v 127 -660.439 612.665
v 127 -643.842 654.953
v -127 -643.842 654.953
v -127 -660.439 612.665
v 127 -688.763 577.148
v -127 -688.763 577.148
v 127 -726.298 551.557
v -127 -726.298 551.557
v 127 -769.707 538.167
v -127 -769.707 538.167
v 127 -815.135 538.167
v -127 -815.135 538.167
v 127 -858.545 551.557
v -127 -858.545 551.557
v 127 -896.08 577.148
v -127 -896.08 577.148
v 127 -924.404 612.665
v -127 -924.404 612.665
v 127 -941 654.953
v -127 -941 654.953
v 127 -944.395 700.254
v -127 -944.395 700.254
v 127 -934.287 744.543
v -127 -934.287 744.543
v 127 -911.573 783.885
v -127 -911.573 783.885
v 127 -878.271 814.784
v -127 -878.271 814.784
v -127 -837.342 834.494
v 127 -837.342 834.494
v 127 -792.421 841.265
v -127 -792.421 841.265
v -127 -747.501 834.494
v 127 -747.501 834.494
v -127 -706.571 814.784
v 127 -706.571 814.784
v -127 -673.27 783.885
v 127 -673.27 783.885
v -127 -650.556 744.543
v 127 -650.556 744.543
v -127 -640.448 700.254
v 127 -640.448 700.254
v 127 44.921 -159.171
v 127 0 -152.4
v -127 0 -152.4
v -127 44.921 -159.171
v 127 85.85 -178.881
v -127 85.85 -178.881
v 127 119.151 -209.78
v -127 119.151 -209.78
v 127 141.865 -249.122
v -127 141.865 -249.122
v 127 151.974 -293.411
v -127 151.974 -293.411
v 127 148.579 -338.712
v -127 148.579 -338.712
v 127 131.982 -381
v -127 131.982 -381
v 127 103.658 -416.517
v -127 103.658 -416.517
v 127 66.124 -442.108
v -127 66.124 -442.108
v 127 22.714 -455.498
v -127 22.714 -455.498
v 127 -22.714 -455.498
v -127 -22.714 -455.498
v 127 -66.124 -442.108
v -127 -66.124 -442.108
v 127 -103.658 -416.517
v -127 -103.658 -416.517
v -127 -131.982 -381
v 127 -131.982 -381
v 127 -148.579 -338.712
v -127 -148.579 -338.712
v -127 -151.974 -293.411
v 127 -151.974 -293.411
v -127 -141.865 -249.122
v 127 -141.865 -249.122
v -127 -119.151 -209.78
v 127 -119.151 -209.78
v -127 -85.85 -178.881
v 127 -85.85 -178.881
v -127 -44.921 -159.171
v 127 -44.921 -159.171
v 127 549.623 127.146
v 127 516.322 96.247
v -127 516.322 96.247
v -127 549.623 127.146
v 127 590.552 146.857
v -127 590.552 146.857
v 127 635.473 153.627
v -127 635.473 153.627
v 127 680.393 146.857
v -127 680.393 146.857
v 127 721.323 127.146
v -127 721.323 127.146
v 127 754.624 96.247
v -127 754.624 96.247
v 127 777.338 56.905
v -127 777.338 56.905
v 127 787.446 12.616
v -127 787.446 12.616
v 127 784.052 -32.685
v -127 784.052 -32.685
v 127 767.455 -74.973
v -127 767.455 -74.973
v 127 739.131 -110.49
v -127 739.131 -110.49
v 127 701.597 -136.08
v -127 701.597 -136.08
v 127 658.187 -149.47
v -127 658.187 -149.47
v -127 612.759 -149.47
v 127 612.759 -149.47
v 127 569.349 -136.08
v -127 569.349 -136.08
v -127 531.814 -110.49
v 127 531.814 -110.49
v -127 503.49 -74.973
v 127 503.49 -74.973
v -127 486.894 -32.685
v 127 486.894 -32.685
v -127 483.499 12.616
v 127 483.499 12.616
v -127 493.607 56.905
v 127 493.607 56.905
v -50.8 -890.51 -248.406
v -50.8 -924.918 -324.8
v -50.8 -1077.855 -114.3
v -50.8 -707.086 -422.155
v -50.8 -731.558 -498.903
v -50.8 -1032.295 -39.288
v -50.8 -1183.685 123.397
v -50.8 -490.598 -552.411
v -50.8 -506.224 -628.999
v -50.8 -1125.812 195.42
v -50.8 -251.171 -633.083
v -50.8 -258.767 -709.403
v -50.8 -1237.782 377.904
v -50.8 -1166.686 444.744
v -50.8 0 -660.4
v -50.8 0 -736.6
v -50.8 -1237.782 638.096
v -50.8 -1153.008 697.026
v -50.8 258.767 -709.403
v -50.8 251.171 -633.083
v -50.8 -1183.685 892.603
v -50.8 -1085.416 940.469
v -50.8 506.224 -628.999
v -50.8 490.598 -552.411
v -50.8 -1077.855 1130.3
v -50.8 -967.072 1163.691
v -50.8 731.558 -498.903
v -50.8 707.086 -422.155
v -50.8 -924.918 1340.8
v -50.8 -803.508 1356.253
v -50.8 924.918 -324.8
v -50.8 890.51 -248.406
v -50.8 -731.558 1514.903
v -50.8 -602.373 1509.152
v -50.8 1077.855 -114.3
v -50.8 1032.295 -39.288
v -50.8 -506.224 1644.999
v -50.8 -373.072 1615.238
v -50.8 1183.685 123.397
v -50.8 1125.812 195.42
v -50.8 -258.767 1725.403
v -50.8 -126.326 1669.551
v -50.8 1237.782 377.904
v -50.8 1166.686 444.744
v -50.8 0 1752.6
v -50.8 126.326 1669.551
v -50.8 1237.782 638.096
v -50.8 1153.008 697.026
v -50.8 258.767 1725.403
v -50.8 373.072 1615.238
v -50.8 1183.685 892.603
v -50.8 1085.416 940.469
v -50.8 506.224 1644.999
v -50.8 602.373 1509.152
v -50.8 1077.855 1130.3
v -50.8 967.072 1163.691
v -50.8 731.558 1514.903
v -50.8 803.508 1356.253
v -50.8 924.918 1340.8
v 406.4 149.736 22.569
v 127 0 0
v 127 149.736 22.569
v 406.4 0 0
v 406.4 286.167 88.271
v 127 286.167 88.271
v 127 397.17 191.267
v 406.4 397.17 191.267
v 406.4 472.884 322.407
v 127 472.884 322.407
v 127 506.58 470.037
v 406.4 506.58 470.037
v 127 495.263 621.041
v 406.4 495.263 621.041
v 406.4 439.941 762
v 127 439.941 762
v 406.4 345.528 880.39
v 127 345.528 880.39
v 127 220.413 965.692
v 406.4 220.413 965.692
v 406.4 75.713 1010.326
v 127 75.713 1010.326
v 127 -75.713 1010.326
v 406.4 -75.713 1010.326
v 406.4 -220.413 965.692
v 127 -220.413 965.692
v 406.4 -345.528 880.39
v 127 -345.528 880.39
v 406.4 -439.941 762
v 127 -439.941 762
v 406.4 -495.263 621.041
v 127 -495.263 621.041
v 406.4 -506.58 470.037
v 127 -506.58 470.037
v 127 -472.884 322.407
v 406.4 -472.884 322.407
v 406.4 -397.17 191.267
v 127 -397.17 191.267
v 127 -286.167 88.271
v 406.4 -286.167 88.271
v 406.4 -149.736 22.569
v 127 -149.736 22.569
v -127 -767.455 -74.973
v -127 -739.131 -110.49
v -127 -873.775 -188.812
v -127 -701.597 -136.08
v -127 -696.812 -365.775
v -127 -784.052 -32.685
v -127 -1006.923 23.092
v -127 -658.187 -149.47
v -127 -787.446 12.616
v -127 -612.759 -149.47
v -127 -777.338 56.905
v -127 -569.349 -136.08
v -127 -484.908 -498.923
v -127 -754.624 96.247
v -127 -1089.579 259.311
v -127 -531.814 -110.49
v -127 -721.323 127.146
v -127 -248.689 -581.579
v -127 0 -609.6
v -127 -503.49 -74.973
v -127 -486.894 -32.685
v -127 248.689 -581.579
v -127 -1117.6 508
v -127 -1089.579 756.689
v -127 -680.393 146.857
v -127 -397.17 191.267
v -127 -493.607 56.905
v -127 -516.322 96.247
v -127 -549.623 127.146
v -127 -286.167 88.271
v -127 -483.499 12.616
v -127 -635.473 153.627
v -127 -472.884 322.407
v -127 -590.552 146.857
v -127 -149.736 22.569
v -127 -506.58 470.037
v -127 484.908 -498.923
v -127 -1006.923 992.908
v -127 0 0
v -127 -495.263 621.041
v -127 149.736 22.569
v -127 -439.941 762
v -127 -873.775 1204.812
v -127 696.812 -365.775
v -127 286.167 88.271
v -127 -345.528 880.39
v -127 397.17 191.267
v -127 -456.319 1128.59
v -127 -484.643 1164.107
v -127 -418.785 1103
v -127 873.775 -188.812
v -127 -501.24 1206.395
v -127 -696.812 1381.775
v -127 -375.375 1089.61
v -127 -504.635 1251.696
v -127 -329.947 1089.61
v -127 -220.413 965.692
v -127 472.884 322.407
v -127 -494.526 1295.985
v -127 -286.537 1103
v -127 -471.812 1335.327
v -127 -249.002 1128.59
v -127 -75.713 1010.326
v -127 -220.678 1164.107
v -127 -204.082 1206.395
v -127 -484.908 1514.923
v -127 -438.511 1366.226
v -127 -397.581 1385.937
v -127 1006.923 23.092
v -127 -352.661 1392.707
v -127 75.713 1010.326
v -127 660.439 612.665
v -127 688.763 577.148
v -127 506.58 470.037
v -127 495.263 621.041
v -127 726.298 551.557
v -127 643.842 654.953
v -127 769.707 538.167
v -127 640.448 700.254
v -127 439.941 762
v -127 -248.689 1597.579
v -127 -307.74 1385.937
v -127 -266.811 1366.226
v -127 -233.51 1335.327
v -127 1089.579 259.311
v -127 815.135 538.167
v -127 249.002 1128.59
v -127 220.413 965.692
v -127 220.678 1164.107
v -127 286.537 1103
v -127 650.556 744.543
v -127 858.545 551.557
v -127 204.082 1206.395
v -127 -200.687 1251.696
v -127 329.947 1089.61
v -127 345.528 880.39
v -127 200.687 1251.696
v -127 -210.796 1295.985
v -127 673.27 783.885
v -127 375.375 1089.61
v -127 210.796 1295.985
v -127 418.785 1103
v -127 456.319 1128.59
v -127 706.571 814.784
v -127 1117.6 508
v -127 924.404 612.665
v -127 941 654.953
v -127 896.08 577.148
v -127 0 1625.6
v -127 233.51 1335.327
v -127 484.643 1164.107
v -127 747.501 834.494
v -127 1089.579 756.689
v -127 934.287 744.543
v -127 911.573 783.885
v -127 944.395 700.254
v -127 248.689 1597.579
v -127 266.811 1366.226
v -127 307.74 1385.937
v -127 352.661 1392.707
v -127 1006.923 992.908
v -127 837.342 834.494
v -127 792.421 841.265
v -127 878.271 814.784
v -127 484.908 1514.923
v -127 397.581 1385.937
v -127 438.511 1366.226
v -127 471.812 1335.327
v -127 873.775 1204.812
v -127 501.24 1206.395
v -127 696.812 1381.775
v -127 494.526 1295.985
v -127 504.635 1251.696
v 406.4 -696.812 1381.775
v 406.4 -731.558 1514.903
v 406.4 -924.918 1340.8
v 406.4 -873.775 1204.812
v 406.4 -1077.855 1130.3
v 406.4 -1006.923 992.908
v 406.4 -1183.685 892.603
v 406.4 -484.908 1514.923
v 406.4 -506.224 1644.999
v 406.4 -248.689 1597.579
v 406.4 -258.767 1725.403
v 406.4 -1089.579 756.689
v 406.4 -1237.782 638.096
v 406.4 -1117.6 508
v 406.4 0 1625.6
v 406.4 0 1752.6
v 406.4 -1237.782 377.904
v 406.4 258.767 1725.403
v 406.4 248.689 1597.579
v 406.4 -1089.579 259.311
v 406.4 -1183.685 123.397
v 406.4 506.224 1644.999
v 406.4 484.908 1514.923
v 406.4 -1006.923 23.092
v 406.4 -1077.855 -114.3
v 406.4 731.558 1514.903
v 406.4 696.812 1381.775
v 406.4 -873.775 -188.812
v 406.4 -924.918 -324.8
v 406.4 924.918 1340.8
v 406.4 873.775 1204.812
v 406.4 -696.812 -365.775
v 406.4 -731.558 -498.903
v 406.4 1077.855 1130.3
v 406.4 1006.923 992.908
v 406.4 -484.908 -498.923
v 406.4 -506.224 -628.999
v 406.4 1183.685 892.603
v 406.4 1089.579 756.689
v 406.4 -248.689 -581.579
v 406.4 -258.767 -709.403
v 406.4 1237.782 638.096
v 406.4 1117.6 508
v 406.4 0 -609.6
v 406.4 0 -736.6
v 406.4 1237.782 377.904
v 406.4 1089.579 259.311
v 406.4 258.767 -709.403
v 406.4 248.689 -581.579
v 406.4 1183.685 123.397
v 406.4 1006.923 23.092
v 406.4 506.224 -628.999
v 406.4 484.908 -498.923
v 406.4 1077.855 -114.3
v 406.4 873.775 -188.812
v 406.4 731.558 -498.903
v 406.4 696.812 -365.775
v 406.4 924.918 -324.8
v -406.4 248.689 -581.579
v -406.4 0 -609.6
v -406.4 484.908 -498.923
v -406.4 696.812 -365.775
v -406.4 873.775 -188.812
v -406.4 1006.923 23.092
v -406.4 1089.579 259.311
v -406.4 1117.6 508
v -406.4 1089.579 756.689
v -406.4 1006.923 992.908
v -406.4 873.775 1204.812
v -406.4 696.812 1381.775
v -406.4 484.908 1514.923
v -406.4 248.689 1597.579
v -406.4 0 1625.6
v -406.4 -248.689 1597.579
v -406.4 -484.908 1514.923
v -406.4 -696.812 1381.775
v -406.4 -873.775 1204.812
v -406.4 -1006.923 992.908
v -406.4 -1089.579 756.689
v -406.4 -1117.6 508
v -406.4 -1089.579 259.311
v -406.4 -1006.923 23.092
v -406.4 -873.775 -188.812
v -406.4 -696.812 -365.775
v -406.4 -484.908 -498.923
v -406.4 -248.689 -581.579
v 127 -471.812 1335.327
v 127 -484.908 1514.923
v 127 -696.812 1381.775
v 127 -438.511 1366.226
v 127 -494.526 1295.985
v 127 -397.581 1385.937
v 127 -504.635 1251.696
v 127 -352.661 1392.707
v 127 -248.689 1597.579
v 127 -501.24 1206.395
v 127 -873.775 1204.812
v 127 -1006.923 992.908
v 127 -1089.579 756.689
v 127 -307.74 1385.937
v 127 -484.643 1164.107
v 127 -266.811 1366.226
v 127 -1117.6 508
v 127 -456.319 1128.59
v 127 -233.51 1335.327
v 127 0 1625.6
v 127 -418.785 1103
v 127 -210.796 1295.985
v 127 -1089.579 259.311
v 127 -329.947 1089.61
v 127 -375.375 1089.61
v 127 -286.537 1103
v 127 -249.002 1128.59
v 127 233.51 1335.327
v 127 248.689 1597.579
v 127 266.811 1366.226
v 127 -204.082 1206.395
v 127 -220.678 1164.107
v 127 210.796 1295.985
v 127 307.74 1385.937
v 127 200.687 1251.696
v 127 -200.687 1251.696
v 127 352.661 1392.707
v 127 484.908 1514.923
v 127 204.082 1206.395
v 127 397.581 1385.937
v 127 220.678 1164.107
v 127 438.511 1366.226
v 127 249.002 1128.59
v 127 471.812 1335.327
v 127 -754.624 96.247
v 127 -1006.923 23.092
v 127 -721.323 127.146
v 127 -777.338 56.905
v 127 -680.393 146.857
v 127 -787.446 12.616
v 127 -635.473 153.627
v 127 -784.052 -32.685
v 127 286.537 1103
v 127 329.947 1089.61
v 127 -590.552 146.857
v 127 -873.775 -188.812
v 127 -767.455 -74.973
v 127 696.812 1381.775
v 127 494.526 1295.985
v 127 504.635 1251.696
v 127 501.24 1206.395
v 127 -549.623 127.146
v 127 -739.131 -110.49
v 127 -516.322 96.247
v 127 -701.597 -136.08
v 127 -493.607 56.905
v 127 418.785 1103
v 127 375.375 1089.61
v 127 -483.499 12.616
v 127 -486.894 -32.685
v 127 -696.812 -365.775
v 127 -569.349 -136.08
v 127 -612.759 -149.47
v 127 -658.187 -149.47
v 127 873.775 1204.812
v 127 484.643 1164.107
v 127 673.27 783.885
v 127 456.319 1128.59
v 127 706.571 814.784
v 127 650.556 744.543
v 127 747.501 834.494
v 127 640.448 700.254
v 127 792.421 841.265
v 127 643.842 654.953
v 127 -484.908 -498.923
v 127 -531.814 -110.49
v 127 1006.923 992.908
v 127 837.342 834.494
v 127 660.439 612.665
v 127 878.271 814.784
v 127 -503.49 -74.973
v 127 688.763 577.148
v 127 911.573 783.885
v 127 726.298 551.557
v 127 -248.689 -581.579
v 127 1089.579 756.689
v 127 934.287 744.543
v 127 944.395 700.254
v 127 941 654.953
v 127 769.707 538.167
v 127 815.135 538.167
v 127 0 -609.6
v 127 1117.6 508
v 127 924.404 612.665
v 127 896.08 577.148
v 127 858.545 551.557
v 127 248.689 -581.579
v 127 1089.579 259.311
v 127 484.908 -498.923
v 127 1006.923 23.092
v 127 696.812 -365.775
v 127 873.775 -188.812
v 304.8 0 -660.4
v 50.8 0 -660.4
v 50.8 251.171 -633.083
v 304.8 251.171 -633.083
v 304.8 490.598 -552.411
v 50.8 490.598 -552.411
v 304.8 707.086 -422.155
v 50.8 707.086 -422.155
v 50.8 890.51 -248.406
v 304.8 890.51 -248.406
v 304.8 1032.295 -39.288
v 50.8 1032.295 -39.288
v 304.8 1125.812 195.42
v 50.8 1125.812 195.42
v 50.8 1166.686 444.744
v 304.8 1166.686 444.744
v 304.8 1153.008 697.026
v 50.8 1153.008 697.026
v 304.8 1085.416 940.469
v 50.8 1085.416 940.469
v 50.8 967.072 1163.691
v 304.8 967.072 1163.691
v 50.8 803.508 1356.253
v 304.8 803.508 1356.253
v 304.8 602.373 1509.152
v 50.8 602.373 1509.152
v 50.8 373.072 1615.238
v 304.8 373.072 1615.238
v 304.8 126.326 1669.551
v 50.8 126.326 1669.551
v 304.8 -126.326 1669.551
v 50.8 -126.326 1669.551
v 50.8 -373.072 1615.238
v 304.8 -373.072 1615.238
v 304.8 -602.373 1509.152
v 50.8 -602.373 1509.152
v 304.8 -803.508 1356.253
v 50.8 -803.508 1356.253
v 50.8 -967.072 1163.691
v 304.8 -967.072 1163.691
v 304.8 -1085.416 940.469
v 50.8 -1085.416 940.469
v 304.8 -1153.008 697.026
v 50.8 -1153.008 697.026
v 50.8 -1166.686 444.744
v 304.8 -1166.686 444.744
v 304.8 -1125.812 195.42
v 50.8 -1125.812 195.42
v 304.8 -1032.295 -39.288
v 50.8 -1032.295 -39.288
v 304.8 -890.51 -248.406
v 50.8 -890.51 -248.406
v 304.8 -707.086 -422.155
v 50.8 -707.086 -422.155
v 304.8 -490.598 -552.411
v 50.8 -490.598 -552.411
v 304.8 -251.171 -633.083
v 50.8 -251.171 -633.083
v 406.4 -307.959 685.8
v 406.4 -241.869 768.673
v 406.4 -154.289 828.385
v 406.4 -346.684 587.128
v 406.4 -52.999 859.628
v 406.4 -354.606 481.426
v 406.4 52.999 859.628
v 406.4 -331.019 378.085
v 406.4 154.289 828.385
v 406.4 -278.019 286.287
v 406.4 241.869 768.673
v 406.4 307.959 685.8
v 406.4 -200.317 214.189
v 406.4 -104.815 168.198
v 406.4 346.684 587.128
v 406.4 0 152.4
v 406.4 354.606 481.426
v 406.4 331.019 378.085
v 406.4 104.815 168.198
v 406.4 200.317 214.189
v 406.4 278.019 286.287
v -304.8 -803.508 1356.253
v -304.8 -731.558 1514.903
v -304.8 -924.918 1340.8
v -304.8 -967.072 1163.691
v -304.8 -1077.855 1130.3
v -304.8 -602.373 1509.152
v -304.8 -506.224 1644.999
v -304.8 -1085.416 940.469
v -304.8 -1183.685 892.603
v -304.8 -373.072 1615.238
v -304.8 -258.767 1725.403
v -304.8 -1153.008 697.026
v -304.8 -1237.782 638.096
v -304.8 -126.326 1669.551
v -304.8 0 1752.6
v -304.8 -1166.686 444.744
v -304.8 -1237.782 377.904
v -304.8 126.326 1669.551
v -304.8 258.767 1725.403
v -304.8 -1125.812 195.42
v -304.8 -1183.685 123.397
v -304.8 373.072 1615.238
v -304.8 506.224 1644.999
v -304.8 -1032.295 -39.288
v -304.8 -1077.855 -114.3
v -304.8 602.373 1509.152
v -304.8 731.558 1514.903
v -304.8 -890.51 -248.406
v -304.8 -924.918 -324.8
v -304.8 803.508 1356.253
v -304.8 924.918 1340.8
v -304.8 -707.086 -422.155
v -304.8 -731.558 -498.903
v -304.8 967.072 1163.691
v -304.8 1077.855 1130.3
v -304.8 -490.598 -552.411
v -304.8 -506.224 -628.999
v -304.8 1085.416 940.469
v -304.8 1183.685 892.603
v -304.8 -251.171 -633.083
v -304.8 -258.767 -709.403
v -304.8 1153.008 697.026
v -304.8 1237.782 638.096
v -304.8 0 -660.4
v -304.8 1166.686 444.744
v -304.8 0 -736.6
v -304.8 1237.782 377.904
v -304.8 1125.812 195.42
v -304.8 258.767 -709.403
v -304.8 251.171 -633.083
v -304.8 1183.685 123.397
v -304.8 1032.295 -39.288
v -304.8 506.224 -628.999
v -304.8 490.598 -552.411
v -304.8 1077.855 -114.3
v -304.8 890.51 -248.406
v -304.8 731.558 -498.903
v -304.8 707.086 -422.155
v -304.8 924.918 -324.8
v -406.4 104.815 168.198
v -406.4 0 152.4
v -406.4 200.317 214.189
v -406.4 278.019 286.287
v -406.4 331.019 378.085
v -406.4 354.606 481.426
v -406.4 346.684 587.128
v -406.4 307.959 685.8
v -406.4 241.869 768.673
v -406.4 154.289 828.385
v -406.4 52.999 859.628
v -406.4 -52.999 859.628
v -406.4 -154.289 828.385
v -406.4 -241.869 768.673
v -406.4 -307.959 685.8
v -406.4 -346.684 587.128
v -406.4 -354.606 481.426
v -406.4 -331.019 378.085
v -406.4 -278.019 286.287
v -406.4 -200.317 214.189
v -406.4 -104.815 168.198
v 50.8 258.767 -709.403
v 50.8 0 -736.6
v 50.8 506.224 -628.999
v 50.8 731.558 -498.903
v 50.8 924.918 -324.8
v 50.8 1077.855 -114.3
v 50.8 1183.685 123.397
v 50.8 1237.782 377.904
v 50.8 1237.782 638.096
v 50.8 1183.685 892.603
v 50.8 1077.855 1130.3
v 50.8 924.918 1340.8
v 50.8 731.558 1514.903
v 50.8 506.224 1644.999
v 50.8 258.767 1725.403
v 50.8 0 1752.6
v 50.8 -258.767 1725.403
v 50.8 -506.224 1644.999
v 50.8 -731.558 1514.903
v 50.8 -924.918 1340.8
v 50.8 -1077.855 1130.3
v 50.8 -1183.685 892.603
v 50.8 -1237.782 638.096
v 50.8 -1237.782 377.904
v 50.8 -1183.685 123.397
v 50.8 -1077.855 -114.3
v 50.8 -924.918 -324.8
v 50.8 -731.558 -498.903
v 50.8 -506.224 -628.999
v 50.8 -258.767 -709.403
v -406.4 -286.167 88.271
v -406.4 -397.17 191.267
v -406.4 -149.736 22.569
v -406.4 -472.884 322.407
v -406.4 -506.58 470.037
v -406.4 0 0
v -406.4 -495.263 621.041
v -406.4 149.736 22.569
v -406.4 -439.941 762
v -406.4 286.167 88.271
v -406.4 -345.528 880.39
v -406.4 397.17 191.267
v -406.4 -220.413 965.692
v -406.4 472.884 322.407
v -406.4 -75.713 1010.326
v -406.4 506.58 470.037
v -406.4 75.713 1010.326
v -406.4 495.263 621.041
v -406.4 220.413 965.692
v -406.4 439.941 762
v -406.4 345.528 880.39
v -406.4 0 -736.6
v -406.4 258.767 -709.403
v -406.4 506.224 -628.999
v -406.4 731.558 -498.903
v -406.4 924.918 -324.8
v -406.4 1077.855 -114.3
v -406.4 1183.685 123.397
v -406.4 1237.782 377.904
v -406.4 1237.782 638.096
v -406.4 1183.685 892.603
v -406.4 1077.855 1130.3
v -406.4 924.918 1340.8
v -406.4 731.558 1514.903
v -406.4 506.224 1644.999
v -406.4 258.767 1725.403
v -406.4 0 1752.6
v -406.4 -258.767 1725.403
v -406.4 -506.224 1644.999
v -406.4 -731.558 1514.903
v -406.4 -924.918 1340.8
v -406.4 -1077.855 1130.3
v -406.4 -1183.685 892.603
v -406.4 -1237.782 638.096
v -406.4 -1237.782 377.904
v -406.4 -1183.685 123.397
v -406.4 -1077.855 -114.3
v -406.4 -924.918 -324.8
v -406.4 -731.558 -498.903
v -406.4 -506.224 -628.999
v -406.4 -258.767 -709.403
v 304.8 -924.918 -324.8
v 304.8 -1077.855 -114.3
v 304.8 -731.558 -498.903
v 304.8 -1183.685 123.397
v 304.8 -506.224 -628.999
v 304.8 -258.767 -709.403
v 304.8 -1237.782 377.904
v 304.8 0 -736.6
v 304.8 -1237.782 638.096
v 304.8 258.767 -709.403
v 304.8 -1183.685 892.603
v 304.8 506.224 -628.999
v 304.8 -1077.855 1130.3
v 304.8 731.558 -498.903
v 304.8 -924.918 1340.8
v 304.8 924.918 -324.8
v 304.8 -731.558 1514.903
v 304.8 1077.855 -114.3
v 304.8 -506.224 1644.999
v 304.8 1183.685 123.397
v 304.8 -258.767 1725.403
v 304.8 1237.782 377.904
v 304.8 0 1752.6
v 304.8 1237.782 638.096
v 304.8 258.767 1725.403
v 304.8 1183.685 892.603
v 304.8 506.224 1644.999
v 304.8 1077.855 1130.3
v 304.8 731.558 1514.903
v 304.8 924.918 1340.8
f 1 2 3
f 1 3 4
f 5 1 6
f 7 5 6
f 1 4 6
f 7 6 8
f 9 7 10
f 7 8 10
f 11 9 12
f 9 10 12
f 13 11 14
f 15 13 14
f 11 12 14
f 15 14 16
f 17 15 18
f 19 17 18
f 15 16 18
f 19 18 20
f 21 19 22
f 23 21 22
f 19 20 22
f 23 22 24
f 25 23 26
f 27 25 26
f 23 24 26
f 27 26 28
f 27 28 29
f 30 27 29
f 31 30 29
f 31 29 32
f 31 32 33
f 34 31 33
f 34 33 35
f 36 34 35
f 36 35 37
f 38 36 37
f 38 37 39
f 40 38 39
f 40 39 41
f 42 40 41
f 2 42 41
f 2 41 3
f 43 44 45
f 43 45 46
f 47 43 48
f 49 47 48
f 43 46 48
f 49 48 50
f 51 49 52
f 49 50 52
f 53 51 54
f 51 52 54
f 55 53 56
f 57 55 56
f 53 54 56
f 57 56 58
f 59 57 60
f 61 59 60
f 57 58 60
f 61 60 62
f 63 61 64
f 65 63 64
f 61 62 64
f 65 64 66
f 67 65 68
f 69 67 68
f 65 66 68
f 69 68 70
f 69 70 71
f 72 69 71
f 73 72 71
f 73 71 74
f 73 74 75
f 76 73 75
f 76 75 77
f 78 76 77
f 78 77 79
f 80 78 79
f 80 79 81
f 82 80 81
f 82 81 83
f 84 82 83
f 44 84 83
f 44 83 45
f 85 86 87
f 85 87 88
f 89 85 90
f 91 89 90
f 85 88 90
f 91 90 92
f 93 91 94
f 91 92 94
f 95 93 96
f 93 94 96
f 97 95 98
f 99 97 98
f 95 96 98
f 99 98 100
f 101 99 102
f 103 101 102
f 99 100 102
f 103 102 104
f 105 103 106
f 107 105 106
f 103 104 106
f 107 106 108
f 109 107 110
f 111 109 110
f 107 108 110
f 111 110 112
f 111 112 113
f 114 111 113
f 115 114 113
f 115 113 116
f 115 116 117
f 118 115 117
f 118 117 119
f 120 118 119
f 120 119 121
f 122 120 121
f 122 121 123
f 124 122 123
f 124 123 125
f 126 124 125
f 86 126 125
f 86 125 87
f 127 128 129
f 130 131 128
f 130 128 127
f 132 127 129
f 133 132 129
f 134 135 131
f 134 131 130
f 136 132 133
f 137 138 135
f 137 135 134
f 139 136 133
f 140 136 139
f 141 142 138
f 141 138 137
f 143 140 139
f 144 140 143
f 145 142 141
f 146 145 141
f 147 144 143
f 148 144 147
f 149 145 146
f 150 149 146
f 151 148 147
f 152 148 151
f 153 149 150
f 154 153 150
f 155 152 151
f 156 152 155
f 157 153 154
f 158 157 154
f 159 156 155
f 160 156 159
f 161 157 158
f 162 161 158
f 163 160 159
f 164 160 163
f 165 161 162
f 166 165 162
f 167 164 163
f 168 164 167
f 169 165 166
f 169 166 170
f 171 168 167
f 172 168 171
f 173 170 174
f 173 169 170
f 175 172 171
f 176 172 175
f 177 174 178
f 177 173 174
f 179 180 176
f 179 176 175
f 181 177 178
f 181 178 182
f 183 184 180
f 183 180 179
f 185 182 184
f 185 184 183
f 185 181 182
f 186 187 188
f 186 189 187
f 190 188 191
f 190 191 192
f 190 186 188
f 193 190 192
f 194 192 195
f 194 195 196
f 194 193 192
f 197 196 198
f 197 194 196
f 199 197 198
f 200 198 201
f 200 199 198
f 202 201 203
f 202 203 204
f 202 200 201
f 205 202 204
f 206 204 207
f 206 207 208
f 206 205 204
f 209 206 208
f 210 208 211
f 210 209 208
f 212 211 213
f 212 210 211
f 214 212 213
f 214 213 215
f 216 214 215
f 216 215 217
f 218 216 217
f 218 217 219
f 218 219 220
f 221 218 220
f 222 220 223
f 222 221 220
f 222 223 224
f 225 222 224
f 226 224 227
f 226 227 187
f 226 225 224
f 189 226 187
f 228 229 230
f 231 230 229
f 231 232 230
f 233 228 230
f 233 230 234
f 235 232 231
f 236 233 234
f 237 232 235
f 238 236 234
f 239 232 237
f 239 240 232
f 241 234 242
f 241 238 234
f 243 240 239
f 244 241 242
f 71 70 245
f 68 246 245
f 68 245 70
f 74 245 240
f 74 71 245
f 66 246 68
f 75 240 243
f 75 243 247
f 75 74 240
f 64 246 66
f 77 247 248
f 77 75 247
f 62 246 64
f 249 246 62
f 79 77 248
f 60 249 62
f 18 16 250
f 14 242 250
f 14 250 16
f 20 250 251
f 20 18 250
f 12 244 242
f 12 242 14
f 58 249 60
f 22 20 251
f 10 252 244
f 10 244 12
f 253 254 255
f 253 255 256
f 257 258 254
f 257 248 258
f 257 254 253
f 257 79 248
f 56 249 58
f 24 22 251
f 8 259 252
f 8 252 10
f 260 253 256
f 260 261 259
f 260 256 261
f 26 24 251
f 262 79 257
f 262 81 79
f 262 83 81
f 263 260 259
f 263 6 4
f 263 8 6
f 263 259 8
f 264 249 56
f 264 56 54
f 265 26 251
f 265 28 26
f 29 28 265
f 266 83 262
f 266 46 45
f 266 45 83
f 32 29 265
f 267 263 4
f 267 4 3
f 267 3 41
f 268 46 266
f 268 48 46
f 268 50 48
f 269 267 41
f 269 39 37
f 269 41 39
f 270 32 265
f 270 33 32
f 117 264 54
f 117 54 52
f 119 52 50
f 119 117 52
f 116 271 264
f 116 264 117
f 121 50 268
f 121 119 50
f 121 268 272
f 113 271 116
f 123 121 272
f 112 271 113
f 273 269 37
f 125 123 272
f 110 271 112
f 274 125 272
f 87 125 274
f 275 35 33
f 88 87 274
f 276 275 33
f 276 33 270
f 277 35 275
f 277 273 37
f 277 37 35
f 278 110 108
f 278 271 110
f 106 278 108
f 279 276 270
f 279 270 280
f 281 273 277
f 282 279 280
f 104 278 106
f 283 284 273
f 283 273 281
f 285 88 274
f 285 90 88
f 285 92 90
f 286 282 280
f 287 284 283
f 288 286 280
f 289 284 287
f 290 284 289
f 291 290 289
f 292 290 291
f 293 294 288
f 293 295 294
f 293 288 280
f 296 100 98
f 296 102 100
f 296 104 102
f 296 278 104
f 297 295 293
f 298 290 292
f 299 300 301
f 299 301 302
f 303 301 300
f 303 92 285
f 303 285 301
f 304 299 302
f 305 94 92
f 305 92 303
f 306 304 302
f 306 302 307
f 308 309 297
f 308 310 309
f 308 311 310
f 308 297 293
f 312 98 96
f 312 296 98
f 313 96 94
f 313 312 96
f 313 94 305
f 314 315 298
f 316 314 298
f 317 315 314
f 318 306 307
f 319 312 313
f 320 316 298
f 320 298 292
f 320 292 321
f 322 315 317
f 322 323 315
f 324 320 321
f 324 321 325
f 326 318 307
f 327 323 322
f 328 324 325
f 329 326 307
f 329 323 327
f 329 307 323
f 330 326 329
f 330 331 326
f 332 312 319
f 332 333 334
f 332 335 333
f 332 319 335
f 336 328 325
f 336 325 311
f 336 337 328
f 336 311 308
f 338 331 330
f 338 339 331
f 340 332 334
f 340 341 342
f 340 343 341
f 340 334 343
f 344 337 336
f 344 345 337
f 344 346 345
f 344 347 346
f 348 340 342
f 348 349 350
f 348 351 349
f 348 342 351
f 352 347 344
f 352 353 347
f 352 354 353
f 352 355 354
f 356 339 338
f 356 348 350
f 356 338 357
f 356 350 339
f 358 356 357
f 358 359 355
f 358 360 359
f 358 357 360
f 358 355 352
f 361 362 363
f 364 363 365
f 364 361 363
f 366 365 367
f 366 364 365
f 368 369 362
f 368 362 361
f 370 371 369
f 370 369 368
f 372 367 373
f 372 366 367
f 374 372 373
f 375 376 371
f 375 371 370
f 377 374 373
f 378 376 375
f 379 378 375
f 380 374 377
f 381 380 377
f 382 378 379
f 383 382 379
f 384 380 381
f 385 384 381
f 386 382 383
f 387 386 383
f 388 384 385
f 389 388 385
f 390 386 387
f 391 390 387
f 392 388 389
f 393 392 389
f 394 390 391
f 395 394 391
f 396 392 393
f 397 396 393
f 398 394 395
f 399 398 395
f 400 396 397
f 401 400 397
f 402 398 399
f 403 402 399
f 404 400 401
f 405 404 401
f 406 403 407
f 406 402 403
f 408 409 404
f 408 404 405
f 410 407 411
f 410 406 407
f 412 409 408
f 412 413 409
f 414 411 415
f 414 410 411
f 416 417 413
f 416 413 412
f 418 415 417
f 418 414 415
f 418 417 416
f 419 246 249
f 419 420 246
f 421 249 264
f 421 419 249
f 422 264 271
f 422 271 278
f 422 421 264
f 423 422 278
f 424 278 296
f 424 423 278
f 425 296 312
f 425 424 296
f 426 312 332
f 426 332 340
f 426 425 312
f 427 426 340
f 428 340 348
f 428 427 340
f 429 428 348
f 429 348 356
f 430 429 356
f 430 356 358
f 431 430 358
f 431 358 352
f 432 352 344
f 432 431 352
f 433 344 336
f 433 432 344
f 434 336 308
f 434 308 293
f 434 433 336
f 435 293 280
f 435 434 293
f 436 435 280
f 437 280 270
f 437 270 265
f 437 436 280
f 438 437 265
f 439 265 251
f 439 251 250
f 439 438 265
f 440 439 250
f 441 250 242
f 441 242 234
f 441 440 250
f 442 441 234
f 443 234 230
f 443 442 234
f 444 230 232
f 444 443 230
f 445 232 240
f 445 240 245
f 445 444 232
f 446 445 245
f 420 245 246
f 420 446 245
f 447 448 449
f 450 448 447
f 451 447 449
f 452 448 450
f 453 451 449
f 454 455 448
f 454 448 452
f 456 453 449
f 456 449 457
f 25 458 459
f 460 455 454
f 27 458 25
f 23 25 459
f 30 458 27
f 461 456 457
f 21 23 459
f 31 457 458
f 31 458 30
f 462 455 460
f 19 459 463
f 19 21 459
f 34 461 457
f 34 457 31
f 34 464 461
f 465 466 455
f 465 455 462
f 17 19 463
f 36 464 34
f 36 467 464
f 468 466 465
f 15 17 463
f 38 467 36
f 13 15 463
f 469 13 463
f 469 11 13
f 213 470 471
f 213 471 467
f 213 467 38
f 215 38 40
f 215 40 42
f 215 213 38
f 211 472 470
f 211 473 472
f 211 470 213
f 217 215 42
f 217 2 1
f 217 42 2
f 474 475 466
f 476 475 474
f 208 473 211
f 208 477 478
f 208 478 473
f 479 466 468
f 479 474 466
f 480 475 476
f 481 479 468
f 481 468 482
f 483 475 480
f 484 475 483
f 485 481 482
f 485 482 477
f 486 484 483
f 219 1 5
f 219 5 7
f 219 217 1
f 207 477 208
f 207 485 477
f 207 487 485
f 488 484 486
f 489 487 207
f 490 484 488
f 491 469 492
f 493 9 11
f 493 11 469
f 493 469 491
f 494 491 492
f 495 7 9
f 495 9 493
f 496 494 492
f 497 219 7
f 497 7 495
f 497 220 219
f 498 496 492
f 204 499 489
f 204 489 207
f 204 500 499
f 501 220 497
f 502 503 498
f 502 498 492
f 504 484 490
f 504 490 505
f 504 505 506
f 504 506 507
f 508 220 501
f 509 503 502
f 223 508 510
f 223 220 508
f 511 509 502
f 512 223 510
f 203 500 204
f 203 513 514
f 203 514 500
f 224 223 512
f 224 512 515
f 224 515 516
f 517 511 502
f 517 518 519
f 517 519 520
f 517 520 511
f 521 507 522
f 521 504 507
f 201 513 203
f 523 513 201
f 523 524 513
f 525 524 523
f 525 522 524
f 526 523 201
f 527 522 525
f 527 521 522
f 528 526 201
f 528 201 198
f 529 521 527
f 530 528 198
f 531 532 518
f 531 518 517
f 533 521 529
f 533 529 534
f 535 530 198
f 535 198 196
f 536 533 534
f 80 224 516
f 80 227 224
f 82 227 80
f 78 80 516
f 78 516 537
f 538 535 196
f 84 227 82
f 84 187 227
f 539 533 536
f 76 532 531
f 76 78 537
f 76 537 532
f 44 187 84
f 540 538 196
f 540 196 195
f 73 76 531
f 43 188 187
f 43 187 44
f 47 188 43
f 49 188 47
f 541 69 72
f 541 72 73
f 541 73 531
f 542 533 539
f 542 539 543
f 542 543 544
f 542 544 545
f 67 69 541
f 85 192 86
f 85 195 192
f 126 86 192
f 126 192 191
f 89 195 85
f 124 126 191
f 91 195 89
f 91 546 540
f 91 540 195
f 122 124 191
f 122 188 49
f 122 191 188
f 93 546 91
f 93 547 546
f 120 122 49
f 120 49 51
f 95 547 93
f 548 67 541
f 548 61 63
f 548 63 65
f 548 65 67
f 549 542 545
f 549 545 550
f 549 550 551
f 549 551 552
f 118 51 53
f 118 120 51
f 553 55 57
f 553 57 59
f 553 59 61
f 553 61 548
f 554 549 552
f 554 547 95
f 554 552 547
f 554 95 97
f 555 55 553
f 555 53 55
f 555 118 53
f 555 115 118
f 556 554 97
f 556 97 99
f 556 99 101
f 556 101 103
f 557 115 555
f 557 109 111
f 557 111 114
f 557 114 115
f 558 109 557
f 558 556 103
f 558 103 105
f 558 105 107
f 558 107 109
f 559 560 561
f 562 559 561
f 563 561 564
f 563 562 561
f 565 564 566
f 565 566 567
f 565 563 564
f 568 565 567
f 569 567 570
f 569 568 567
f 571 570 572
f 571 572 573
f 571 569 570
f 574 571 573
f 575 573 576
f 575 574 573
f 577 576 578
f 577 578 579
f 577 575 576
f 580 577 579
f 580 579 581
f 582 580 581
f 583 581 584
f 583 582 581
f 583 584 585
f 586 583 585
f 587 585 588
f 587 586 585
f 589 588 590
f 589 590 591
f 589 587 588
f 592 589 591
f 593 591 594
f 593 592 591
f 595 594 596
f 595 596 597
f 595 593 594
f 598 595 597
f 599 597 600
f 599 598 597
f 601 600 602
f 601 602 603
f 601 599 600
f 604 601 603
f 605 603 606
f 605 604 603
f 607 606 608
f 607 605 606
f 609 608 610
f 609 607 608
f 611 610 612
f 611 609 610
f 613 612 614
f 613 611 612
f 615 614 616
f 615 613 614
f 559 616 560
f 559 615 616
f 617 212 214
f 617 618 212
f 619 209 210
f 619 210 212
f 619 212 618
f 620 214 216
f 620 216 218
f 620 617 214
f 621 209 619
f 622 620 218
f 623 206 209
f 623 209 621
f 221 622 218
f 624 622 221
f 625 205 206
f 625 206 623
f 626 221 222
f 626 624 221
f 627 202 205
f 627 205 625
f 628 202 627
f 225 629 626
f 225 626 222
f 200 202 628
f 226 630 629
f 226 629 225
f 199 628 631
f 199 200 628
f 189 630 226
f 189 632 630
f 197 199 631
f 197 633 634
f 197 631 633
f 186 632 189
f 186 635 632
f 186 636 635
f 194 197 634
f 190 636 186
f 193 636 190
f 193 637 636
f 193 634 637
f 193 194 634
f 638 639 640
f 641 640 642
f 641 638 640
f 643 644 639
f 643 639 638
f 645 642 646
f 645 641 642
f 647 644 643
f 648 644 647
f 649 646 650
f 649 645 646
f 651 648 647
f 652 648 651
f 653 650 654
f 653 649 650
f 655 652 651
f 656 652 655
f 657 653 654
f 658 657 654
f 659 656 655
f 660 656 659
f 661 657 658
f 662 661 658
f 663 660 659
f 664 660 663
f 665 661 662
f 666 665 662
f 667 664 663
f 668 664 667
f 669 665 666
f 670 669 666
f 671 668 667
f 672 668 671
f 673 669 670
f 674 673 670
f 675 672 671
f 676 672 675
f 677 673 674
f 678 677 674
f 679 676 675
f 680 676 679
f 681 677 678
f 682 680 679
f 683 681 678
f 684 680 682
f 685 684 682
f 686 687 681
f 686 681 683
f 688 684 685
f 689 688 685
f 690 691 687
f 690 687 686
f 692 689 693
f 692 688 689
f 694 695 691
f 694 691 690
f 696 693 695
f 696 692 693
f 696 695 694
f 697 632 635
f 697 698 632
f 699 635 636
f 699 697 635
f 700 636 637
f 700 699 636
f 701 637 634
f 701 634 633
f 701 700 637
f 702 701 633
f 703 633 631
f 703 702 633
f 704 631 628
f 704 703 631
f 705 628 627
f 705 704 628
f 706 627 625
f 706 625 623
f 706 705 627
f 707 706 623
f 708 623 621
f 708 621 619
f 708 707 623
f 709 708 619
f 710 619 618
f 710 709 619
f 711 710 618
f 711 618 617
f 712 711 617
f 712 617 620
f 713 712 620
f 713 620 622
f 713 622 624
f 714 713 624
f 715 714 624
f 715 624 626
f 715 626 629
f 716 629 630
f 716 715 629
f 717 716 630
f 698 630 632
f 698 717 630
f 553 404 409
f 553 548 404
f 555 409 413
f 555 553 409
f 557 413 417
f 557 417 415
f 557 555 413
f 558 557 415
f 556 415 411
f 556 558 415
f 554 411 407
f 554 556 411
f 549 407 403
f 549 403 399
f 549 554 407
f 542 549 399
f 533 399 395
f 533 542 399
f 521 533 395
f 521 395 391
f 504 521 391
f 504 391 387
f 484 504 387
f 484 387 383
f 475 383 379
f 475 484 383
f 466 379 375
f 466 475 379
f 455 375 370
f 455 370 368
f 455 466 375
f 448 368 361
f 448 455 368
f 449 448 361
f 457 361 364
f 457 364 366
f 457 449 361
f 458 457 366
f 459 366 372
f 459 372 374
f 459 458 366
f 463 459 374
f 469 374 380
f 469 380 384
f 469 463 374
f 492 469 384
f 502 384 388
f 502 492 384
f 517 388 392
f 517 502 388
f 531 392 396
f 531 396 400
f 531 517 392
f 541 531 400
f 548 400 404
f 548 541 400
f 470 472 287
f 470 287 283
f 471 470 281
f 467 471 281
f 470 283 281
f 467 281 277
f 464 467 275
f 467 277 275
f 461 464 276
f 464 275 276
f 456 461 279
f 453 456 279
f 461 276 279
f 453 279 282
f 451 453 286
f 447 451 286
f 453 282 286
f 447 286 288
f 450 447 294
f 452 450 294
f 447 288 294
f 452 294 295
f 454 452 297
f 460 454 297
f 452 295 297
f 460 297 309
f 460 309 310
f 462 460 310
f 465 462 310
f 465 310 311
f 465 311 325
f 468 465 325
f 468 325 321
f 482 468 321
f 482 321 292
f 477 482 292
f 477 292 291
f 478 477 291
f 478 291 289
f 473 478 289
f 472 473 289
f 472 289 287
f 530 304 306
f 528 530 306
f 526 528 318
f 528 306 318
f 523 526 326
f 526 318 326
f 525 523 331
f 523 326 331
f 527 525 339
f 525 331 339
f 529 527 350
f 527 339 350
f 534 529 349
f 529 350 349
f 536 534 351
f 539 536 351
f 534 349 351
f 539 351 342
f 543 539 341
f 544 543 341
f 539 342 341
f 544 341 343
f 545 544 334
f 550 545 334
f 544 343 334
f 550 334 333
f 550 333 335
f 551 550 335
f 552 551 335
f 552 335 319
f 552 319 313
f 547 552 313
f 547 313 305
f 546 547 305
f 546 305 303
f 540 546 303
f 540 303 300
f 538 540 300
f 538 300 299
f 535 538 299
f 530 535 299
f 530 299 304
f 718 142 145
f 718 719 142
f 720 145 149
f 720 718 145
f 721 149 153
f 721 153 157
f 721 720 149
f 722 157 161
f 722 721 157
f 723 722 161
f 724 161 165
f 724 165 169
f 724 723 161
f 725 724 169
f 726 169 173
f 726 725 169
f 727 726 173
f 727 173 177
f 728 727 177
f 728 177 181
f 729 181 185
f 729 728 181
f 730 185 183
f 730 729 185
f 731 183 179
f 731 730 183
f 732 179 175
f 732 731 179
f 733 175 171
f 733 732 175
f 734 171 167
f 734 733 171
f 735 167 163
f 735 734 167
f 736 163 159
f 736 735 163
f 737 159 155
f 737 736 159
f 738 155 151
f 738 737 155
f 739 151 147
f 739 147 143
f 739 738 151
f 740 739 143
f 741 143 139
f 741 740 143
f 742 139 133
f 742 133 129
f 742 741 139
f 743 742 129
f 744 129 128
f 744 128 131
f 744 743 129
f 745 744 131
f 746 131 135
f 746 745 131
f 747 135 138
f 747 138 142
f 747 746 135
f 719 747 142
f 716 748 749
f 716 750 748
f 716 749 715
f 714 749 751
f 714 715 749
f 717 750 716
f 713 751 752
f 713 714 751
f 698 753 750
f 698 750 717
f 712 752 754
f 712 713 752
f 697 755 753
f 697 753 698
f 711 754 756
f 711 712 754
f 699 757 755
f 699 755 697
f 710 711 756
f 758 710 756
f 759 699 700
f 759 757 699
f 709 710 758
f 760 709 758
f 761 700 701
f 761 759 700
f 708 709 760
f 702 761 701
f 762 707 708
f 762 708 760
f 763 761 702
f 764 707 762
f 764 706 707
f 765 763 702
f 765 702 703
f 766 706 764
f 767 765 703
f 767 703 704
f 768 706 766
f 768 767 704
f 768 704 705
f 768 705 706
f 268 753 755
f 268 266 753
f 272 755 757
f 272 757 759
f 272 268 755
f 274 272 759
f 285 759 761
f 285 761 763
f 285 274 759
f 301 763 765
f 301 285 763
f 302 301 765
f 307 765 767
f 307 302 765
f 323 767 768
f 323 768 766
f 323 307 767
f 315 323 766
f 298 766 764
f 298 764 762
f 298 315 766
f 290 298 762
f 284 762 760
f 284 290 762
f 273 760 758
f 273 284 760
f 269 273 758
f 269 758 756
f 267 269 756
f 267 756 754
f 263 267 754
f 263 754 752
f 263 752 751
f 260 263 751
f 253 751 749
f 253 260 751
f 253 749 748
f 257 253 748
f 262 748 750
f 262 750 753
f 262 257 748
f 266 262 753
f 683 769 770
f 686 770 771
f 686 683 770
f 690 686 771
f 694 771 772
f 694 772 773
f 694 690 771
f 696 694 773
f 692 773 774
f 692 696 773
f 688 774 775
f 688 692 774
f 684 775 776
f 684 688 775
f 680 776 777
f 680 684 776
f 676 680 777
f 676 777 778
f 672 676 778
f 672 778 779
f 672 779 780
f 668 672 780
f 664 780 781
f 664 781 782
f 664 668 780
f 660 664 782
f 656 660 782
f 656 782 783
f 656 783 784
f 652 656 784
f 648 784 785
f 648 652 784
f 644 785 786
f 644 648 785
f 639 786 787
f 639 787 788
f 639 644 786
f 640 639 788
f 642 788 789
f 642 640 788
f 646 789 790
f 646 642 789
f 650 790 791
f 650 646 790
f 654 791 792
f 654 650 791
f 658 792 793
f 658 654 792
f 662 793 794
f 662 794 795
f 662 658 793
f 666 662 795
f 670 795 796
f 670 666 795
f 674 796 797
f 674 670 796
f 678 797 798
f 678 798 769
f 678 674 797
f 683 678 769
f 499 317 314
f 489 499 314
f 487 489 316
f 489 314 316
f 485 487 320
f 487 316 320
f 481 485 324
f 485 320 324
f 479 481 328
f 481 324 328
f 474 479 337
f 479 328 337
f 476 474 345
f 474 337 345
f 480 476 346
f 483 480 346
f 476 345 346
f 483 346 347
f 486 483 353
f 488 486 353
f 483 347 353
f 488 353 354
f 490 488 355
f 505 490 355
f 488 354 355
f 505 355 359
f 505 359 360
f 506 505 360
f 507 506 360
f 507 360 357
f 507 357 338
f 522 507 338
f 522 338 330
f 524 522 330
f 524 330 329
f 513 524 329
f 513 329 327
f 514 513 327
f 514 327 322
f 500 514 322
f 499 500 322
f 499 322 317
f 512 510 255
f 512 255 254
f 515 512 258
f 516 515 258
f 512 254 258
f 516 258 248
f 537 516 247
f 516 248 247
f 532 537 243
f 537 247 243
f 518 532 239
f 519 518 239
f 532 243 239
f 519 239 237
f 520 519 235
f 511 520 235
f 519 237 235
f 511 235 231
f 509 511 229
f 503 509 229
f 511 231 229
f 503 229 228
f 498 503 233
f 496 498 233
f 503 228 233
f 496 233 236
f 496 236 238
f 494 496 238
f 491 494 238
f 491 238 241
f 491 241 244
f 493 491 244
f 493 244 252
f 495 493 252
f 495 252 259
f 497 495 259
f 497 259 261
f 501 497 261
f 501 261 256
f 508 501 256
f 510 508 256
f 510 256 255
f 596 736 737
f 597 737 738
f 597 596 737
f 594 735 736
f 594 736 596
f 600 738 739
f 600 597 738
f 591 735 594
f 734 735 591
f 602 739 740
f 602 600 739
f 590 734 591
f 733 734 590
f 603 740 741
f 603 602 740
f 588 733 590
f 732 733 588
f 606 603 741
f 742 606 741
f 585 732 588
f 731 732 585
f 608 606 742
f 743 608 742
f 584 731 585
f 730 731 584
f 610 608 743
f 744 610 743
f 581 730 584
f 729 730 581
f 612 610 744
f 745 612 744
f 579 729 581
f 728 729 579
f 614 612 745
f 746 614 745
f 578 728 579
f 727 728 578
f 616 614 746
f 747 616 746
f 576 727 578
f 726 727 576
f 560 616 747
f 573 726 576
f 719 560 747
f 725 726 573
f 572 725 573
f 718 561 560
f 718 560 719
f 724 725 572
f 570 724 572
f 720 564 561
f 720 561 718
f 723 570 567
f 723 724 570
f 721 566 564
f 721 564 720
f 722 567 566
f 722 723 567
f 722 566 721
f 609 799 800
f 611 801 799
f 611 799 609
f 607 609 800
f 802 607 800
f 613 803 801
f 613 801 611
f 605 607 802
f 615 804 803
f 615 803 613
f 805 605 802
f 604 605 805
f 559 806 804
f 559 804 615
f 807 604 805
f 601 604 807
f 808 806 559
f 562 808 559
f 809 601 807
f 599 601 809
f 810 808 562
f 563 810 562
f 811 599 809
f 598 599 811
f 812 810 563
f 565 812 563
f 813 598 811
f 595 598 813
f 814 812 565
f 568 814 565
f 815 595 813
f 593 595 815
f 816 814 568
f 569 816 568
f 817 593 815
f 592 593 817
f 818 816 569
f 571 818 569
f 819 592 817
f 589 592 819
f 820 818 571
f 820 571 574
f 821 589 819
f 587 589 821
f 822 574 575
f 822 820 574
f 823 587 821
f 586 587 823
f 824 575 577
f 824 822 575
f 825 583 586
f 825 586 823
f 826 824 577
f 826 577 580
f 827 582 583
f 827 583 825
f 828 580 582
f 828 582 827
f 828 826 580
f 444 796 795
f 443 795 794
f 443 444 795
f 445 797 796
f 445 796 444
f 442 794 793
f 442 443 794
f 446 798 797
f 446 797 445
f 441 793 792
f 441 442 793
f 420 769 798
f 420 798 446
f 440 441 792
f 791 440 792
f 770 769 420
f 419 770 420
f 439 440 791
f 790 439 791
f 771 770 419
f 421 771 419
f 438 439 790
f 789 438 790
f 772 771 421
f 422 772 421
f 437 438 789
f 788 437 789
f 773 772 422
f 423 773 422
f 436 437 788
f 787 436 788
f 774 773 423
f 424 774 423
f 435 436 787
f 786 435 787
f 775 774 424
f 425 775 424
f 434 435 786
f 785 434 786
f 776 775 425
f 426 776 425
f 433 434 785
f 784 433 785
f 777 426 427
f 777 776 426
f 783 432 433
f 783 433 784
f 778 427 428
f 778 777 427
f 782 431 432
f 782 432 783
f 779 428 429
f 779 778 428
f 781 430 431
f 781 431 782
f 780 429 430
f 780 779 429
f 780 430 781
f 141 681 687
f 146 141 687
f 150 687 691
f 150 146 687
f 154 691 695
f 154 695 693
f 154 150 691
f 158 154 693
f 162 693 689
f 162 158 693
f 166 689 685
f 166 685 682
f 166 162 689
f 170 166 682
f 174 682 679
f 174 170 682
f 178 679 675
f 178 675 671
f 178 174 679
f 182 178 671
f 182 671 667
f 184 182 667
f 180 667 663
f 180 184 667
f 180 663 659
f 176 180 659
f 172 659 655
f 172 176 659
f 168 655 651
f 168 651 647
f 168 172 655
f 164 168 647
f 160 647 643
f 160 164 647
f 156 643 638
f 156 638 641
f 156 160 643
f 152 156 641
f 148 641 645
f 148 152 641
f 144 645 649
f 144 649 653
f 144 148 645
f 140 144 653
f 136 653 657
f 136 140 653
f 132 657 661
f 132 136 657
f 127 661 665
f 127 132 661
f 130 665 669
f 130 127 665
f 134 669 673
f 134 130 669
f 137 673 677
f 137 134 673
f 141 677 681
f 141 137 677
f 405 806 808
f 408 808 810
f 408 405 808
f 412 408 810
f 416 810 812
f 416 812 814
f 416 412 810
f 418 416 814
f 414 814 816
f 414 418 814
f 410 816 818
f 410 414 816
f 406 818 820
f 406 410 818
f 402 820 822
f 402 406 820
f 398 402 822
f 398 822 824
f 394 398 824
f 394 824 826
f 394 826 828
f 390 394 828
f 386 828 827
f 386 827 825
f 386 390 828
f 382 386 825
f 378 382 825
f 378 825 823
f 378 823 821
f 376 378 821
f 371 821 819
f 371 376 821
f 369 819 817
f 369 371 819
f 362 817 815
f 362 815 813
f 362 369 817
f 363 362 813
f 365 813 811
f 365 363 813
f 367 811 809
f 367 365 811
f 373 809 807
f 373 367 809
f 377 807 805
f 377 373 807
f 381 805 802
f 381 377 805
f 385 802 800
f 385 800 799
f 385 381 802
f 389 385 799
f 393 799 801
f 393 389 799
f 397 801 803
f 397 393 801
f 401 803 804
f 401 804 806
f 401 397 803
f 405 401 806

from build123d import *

# Parameters (mm, degrees)
F3_DEPTH        = 533.401
F3_COPIES_COUNT = 7


# Not quite as in the source:
# - a pattern or mirror of a feature is missing from the dataset's text; its kind, count and spacing are read off the source's solid
# - a feature names something its author has since deleted; it is built from what else it names


with BuildPart() as f1:
    # F0 (on Front) → F1 (revolve)
    with BuildSketch(Plane.XZ):
        Polygon((127, 0), (-127, 0), (-127, -609.6), (-406.4, -609.6), (-406.4, -736.6), (-304.8, -736.6), (-304.8, -660.4), (-50.8, -660.4), (-50.8, -736.6), (50.8, -736.6), (50.8, -660.4), (304.8, -660.4), (304.8, -736.6), (406.4, -736.6), (406.4, -609.6), (127, -609.6), align=None)
        Polygon((-406.4, 0), (-127, 0), (127, 0), (406.4, 0), (406.4, 152.4), (0, 152.4), (-406.4, 152.4), align=None)
    revolve(axis=Axis((0, 0, 508), (1, 0, 0)))

    # F2 (on face) → F3 (cut, through all)
    with BuildSketch(Plane(origin=(-127, 0, 0), x_dir=(0, -1, 0), z_dir=(-1, 0, 0))):
        with BuildLine():
            ThreePointArc((152.4, -304.8), (107.7630734528, -197.0369265472), (0, -152.4))
            ThreePointArc((0, -152.4), (-107.7630734528, -412.5630734528), (152.4, -304.8))
        make_face()
    f3 = extrude(amount=-F3_DEPTH, mode=Mode.SUBTRACT)

    # F3_copies: F3 ×7 about axis
    f3_copies_axis = Axis((0, 0, 508), (1, 0, 0))
    for i in range(1, F3_COPIES_COUNT):
        add(f3.rotate(f3_copies_axis, i * 360 / F3_COPIES_COUNT), mode=Mode.SUBTRACT)


solid = f1.part
